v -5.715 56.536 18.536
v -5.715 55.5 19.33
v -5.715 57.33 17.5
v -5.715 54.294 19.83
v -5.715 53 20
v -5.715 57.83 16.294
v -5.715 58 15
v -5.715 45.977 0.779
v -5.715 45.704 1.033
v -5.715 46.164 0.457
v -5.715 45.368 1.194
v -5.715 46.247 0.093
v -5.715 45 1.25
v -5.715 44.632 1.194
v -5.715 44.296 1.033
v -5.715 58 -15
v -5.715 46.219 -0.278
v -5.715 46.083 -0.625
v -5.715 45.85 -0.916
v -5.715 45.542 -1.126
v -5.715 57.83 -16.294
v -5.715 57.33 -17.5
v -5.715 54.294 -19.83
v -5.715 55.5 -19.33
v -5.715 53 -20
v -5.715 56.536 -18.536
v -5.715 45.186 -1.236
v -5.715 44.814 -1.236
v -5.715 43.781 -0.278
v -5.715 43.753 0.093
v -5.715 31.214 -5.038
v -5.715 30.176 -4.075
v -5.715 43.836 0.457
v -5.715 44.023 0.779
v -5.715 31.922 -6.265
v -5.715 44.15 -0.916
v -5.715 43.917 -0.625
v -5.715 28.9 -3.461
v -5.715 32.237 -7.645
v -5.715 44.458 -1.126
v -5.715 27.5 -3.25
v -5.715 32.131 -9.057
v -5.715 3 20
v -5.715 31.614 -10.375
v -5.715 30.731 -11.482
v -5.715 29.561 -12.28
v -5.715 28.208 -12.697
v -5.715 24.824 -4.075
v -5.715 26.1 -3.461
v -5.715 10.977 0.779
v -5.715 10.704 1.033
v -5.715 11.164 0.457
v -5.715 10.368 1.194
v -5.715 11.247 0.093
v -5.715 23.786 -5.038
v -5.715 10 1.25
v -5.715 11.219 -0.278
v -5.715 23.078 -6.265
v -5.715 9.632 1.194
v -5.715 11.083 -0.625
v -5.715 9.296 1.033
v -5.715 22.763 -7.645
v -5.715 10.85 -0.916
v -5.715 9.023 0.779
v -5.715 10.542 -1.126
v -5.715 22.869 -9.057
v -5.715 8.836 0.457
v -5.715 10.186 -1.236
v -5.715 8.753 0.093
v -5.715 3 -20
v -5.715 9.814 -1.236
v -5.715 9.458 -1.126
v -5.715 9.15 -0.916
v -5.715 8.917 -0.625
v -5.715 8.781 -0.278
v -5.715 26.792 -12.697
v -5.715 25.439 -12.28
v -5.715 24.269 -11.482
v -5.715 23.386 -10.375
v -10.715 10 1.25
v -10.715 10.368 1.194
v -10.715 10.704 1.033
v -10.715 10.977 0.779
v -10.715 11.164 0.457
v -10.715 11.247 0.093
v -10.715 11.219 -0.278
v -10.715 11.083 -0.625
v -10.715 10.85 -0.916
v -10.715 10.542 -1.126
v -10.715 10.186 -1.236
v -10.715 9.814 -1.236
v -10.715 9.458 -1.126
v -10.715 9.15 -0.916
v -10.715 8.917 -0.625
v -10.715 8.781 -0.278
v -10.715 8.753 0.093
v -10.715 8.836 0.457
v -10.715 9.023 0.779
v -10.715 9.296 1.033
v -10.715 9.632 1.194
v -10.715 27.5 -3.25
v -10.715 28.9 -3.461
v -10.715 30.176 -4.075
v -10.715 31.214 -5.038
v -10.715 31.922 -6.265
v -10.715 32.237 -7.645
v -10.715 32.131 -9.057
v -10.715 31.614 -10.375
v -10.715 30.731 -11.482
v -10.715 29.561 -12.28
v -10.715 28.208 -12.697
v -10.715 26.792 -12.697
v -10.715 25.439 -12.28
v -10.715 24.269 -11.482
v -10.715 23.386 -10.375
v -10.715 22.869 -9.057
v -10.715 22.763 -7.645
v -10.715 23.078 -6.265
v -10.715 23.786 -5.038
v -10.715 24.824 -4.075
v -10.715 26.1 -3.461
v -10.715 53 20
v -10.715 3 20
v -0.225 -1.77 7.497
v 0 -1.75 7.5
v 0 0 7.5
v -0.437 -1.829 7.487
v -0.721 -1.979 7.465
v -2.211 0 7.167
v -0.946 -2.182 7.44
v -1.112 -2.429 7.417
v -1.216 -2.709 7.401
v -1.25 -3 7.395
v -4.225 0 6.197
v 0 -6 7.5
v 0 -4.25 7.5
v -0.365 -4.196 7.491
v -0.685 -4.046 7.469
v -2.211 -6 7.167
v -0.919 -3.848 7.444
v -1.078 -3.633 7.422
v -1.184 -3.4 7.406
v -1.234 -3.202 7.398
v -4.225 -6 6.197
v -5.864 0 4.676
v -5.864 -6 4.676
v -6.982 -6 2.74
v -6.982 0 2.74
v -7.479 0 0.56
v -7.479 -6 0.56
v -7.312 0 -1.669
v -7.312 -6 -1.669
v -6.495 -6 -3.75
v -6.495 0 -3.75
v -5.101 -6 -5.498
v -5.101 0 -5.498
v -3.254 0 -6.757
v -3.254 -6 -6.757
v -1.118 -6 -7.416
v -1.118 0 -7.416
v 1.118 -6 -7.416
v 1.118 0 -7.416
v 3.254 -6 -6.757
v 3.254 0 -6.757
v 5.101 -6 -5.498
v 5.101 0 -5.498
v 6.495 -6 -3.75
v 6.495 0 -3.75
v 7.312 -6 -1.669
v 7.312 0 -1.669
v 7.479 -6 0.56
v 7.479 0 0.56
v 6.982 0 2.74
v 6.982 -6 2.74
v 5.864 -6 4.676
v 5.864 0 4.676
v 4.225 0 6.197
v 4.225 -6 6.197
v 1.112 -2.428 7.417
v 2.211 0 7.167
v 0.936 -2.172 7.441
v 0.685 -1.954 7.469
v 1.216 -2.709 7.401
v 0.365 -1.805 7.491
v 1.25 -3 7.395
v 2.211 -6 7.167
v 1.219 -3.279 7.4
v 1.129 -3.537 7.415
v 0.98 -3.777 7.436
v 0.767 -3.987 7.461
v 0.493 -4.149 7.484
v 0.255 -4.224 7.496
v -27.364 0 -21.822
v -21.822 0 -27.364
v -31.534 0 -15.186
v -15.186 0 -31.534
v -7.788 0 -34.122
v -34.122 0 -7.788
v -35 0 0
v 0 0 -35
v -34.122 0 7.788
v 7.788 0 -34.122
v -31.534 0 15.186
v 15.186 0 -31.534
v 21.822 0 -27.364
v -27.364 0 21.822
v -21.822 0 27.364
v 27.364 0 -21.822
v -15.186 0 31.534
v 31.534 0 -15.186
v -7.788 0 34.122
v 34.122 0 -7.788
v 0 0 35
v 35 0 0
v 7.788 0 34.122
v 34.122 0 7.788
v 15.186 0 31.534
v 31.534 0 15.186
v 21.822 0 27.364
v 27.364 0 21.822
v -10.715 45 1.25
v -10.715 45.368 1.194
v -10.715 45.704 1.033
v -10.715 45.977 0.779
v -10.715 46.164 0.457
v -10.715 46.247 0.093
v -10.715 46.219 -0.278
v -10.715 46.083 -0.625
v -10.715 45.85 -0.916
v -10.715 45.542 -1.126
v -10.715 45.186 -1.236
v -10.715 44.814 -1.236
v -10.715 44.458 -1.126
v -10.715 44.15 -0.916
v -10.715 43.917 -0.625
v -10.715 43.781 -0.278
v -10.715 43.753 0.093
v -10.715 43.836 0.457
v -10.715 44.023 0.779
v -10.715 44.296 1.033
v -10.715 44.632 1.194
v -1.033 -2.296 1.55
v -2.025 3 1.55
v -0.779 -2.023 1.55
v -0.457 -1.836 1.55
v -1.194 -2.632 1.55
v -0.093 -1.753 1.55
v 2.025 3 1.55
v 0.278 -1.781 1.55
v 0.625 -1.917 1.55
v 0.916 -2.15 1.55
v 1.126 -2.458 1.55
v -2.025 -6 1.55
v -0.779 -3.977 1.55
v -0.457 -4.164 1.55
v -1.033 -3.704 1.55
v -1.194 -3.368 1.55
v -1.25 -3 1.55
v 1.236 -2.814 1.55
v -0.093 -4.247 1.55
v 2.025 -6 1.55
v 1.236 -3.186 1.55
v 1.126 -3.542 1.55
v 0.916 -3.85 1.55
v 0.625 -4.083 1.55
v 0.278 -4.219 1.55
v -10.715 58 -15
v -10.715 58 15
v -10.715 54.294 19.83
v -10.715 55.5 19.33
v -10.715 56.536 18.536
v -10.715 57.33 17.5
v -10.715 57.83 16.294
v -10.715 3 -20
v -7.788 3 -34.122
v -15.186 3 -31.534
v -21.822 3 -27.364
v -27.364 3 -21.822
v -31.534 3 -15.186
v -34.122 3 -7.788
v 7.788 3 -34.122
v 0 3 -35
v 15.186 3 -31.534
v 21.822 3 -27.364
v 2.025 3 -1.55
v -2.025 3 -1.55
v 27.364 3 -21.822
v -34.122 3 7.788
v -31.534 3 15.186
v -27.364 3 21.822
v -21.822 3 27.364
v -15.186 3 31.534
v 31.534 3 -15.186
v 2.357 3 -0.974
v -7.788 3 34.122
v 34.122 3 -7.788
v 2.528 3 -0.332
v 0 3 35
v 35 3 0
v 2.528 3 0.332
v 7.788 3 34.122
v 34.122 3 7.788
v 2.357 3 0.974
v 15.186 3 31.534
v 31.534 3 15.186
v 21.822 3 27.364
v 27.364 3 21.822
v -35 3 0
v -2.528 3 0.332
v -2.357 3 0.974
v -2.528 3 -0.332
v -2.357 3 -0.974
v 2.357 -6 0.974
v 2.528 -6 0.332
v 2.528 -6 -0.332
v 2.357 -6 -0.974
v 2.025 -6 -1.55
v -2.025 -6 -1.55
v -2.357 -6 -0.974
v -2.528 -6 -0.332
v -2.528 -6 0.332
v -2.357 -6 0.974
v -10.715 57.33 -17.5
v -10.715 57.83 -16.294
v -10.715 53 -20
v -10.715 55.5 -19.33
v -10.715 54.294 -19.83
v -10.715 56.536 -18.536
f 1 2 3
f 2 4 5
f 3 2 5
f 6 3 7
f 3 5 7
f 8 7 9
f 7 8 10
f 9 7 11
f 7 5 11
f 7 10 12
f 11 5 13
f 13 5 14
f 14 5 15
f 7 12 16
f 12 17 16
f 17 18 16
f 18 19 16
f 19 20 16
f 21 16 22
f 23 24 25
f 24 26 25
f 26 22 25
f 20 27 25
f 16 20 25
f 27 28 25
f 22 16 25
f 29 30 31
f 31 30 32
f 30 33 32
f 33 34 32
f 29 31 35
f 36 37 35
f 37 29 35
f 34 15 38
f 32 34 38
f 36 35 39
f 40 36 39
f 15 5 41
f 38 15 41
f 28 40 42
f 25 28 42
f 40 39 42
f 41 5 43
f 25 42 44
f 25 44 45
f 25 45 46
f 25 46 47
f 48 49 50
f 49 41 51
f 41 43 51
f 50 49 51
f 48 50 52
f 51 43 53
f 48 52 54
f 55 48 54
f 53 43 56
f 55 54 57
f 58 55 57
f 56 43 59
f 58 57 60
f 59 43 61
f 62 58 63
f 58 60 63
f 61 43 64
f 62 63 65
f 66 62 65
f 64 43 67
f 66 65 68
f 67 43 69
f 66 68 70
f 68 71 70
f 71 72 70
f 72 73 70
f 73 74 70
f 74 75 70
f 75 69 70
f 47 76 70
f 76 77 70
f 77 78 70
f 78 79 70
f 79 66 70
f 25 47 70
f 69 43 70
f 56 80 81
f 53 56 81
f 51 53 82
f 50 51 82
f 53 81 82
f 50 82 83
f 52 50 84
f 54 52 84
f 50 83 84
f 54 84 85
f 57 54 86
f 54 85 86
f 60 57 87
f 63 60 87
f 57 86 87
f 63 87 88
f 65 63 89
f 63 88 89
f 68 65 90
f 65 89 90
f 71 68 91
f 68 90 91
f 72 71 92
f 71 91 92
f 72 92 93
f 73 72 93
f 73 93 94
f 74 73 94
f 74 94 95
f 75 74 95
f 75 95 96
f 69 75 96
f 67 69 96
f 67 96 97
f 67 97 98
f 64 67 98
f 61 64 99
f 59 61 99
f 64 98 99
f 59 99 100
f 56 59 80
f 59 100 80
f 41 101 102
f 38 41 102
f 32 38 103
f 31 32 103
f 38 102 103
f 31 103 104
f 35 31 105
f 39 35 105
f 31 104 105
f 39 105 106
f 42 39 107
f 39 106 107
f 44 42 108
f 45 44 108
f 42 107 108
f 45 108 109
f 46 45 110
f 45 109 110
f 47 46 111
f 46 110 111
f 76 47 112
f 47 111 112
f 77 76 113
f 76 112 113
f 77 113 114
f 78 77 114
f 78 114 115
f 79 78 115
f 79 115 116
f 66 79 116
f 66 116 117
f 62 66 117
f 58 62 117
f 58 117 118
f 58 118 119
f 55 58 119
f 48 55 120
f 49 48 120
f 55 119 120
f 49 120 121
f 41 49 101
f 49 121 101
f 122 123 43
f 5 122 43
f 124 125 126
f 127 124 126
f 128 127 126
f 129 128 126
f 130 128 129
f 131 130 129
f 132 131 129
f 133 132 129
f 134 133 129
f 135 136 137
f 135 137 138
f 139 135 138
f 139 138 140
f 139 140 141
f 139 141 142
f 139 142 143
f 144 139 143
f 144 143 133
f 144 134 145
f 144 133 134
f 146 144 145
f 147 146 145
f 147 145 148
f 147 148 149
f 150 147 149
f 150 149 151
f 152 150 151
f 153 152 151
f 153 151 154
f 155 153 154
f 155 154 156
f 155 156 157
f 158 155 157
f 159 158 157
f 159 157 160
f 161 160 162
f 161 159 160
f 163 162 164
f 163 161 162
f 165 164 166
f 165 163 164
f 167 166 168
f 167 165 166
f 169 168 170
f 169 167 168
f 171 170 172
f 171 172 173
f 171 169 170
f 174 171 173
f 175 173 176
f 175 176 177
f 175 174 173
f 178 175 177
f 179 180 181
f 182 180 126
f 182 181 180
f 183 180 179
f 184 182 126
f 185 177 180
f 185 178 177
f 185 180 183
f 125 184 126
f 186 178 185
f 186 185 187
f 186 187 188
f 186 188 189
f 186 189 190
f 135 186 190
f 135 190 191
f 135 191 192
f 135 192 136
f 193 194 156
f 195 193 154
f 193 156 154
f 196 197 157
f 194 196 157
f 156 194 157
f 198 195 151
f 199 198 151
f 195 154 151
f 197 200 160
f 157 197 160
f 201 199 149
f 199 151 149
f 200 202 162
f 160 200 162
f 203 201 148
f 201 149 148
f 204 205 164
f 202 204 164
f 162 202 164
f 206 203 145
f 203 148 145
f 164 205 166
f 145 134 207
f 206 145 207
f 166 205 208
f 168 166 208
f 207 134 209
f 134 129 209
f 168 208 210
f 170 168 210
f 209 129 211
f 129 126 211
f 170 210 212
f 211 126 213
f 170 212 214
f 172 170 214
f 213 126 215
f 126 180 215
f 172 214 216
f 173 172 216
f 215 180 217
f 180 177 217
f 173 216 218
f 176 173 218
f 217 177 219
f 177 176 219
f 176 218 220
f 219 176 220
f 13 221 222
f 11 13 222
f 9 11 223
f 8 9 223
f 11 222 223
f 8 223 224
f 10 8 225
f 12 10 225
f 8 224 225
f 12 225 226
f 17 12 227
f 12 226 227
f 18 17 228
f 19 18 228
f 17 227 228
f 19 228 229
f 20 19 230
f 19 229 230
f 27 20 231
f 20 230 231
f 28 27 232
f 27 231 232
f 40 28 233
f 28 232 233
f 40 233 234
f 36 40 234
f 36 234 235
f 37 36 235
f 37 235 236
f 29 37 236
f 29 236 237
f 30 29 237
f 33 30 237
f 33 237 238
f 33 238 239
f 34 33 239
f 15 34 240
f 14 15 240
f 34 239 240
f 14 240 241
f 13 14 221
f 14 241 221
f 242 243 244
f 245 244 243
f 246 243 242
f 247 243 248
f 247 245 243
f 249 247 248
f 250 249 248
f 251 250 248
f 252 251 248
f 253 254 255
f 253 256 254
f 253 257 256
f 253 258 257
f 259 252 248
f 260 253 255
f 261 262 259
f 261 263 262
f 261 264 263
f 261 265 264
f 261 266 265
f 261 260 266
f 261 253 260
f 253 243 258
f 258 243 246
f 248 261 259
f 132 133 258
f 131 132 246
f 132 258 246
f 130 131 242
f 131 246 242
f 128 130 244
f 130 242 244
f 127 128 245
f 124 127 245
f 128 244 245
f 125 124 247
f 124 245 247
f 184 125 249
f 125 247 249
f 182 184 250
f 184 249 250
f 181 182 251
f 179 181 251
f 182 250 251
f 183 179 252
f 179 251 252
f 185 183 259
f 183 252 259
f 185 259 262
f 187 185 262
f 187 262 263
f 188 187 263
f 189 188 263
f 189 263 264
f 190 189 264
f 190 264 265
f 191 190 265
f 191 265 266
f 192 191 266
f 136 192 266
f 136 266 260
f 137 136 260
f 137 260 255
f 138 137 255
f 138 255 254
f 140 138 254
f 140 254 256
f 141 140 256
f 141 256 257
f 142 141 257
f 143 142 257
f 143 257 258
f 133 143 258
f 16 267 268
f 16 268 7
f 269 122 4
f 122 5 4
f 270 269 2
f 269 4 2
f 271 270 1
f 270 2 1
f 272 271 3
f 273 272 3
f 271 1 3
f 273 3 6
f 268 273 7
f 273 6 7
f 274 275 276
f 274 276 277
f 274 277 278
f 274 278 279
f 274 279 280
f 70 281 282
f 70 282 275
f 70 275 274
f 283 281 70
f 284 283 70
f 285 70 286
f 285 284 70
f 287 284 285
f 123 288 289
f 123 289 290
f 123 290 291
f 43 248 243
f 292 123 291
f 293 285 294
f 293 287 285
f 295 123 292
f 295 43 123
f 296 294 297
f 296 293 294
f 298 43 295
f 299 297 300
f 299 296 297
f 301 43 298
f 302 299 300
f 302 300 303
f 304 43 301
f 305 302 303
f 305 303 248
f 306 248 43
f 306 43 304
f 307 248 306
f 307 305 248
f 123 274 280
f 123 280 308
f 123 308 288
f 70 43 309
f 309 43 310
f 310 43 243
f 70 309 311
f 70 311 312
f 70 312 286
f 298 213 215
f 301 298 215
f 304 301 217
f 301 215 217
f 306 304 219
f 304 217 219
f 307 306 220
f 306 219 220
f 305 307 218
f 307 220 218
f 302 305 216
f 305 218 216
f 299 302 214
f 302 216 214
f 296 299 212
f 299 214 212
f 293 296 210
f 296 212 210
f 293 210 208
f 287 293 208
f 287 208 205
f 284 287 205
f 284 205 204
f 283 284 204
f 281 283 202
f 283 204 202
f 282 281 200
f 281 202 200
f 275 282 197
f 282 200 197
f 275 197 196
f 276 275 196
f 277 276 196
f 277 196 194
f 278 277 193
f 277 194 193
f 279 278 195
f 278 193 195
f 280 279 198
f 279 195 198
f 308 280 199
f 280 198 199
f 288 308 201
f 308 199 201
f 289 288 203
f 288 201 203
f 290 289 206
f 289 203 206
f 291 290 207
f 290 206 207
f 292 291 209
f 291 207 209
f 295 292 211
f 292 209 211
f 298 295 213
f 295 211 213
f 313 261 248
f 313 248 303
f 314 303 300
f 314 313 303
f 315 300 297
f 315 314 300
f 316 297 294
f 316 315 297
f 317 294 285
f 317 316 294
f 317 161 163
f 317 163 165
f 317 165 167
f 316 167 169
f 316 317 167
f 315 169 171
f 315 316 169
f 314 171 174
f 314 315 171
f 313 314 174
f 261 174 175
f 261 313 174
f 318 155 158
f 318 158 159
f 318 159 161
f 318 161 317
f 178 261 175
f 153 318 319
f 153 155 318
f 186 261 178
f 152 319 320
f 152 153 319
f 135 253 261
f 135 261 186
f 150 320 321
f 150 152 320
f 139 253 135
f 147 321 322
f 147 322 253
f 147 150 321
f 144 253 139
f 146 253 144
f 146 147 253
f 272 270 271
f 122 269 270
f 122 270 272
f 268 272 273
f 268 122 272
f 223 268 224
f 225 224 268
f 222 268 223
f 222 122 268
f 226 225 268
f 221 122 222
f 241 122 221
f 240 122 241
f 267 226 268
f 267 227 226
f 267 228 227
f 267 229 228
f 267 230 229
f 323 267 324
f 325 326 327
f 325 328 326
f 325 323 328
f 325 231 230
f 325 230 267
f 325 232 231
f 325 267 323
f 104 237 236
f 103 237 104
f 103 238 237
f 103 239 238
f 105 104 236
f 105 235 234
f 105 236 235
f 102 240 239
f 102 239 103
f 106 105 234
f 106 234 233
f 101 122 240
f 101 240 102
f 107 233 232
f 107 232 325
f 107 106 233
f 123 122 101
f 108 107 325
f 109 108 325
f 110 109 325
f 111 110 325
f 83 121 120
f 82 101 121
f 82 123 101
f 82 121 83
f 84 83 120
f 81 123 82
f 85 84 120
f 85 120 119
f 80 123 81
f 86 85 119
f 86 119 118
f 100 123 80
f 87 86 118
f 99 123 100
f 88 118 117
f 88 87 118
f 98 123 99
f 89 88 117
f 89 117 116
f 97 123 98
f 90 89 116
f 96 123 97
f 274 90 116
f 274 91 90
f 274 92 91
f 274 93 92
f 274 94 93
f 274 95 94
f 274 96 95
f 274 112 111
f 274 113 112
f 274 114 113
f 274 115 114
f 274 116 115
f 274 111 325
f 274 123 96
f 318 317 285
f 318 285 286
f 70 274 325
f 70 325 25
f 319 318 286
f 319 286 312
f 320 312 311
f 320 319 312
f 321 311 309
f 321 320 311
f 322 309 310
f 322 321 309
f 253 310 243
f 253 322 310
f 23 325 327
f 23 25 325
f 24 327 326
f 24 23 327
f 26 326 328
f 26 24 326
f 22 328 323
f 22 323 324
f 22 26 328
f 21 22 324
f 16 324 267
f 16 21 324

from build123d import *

# Parameters (mm, degrees)
CROQUIS1_R              = 35
SALIENTE_EXTRUIR1_DEPTH = 3
SALIENTE_EXTRUIR2_START = 6
CROQUIS2_R              = 7.5
SALIENTE_EXTRUIR2_DEPTH = 6
CROQUIS3_R              = 1.25
CORTAR_EXTRUIR1_DEPTH   = 6
CROQUIS4_W              = 5
CROQUIS4_H              = 40
SALIENTE_EXTRUIR3_DEPTH = 55
CROQUIS5_R              = 1.25
CROQUIS5_R_2            = 4.75
CORTAR_EXTRUIR2_DEPTH   = 5
REDONDEO1_R             = 5


with BuildPart() as part:
    # Croquis1 → Saliente-Extruir1 (new body)
    with BuildSketch(Plane(origin=(0, 0, 0), x_dir=(1, 0, 0), z_dir=(0, 1, 0))):
        with Locations(Location((0, 0, 0), (0, 0, 270))):
            Circle(CROQUIS1_R)
        with BuildLine():
            Line((-2.024845673, 1.55), (2.024845673, 1.55))
            ThreePointArc((2.024845673, 1.55), (2.55, 0), (2.024845673, -1.55))
            Line((2.024845673, -1.55), (-2.024845673, -1.55))
            ThreePointArc((-2.024845673, -1.55), (-2.55, 0), (-2.024845673, 1.55))
        make_face(mode=Mode.SUBTRACT)
    extrude(amount=SALIENTE_EXTRUIR1_DEPTH)

    # Croquis2 → Saliente-Extruir2 (add)
    with BuildSketch(Plane.XZ.offset(SALIENTE_EXTRUIR2_START)):
        with Locations(Location((0, 0, 0), (0, 0, 90))):
            Circle(CROQUIS2_R)
        with BuildLine():
            Line((-2.024845673, 1.55), (2.024845673, 1.55))
            ThreePointArc((2.024845673, 1.55), (2.55, 0), (2.024845673, -1.55))
            Line((2.024845673, -1.55), (-2.024845673, -1.55))
            ThreePointArc((-2.024845673, -1.55), (-2.55, 0), (-2.024845673, 1.55))
        make_face(mode=Mode.SUBTRACT)
    extrude(amount=-SALIENTE_EXTRUIR2_DEPTH)

    # Croquis3 → Cortar-Extruir1 (cut)
    with BuildSketch(Plane(origin=(0, 0, 1.55), x_dir=(-1, 0, 0), z_dir=(0, 0, -1))):
        with Locations((0, -3)):
            Circle(CROQUIS3_R)
    extrude(amount=-CORTAR_EXTRUIR1_DEPTH, mode=Mode.SUBTRACT)

    # Croquis4 → Saliente-Extruir3 (add)
    with BuildSketch(Plane(origin=(0, 3, 0), x_dir=(1, 0, 0), z_dir=(0, 1, 0))):
        with Locations((-8.215048019, 0)):
            Rectangle(CROQUIS4_W, CROQUIS4_H)
    extrude(amount=SALIENTE_EXTRUIR3_DEPTH)

    # Croquis5 → Cortar-Extruir2 (cut)
    with BuildSketch(Plane.ZY.offset(10.715048019)):
        with Locations((0, 45)):
            Circle(CROQUIS5_R)
        with Locations((0, 10)):
            Circle(CROQUIS5_R)
        with Locations((-8, 27.5)):
            Circle(CROQUIS5_R_2)
    extrude(amount=-CORTAR_EXTRUIR2_DEPTH, mode=Mode.SUBTRACT)

    # Redondeo1
    redondeo1_edges = [part.edges().sort_by_distance(p)[0] for p in [
        (-8.215048019, 58, -20),
        (-8.215048019, 58, 20),
    ]]
    fillet(redondeo1_edges, radius=REDONDEO1_R)


solid = part.part
